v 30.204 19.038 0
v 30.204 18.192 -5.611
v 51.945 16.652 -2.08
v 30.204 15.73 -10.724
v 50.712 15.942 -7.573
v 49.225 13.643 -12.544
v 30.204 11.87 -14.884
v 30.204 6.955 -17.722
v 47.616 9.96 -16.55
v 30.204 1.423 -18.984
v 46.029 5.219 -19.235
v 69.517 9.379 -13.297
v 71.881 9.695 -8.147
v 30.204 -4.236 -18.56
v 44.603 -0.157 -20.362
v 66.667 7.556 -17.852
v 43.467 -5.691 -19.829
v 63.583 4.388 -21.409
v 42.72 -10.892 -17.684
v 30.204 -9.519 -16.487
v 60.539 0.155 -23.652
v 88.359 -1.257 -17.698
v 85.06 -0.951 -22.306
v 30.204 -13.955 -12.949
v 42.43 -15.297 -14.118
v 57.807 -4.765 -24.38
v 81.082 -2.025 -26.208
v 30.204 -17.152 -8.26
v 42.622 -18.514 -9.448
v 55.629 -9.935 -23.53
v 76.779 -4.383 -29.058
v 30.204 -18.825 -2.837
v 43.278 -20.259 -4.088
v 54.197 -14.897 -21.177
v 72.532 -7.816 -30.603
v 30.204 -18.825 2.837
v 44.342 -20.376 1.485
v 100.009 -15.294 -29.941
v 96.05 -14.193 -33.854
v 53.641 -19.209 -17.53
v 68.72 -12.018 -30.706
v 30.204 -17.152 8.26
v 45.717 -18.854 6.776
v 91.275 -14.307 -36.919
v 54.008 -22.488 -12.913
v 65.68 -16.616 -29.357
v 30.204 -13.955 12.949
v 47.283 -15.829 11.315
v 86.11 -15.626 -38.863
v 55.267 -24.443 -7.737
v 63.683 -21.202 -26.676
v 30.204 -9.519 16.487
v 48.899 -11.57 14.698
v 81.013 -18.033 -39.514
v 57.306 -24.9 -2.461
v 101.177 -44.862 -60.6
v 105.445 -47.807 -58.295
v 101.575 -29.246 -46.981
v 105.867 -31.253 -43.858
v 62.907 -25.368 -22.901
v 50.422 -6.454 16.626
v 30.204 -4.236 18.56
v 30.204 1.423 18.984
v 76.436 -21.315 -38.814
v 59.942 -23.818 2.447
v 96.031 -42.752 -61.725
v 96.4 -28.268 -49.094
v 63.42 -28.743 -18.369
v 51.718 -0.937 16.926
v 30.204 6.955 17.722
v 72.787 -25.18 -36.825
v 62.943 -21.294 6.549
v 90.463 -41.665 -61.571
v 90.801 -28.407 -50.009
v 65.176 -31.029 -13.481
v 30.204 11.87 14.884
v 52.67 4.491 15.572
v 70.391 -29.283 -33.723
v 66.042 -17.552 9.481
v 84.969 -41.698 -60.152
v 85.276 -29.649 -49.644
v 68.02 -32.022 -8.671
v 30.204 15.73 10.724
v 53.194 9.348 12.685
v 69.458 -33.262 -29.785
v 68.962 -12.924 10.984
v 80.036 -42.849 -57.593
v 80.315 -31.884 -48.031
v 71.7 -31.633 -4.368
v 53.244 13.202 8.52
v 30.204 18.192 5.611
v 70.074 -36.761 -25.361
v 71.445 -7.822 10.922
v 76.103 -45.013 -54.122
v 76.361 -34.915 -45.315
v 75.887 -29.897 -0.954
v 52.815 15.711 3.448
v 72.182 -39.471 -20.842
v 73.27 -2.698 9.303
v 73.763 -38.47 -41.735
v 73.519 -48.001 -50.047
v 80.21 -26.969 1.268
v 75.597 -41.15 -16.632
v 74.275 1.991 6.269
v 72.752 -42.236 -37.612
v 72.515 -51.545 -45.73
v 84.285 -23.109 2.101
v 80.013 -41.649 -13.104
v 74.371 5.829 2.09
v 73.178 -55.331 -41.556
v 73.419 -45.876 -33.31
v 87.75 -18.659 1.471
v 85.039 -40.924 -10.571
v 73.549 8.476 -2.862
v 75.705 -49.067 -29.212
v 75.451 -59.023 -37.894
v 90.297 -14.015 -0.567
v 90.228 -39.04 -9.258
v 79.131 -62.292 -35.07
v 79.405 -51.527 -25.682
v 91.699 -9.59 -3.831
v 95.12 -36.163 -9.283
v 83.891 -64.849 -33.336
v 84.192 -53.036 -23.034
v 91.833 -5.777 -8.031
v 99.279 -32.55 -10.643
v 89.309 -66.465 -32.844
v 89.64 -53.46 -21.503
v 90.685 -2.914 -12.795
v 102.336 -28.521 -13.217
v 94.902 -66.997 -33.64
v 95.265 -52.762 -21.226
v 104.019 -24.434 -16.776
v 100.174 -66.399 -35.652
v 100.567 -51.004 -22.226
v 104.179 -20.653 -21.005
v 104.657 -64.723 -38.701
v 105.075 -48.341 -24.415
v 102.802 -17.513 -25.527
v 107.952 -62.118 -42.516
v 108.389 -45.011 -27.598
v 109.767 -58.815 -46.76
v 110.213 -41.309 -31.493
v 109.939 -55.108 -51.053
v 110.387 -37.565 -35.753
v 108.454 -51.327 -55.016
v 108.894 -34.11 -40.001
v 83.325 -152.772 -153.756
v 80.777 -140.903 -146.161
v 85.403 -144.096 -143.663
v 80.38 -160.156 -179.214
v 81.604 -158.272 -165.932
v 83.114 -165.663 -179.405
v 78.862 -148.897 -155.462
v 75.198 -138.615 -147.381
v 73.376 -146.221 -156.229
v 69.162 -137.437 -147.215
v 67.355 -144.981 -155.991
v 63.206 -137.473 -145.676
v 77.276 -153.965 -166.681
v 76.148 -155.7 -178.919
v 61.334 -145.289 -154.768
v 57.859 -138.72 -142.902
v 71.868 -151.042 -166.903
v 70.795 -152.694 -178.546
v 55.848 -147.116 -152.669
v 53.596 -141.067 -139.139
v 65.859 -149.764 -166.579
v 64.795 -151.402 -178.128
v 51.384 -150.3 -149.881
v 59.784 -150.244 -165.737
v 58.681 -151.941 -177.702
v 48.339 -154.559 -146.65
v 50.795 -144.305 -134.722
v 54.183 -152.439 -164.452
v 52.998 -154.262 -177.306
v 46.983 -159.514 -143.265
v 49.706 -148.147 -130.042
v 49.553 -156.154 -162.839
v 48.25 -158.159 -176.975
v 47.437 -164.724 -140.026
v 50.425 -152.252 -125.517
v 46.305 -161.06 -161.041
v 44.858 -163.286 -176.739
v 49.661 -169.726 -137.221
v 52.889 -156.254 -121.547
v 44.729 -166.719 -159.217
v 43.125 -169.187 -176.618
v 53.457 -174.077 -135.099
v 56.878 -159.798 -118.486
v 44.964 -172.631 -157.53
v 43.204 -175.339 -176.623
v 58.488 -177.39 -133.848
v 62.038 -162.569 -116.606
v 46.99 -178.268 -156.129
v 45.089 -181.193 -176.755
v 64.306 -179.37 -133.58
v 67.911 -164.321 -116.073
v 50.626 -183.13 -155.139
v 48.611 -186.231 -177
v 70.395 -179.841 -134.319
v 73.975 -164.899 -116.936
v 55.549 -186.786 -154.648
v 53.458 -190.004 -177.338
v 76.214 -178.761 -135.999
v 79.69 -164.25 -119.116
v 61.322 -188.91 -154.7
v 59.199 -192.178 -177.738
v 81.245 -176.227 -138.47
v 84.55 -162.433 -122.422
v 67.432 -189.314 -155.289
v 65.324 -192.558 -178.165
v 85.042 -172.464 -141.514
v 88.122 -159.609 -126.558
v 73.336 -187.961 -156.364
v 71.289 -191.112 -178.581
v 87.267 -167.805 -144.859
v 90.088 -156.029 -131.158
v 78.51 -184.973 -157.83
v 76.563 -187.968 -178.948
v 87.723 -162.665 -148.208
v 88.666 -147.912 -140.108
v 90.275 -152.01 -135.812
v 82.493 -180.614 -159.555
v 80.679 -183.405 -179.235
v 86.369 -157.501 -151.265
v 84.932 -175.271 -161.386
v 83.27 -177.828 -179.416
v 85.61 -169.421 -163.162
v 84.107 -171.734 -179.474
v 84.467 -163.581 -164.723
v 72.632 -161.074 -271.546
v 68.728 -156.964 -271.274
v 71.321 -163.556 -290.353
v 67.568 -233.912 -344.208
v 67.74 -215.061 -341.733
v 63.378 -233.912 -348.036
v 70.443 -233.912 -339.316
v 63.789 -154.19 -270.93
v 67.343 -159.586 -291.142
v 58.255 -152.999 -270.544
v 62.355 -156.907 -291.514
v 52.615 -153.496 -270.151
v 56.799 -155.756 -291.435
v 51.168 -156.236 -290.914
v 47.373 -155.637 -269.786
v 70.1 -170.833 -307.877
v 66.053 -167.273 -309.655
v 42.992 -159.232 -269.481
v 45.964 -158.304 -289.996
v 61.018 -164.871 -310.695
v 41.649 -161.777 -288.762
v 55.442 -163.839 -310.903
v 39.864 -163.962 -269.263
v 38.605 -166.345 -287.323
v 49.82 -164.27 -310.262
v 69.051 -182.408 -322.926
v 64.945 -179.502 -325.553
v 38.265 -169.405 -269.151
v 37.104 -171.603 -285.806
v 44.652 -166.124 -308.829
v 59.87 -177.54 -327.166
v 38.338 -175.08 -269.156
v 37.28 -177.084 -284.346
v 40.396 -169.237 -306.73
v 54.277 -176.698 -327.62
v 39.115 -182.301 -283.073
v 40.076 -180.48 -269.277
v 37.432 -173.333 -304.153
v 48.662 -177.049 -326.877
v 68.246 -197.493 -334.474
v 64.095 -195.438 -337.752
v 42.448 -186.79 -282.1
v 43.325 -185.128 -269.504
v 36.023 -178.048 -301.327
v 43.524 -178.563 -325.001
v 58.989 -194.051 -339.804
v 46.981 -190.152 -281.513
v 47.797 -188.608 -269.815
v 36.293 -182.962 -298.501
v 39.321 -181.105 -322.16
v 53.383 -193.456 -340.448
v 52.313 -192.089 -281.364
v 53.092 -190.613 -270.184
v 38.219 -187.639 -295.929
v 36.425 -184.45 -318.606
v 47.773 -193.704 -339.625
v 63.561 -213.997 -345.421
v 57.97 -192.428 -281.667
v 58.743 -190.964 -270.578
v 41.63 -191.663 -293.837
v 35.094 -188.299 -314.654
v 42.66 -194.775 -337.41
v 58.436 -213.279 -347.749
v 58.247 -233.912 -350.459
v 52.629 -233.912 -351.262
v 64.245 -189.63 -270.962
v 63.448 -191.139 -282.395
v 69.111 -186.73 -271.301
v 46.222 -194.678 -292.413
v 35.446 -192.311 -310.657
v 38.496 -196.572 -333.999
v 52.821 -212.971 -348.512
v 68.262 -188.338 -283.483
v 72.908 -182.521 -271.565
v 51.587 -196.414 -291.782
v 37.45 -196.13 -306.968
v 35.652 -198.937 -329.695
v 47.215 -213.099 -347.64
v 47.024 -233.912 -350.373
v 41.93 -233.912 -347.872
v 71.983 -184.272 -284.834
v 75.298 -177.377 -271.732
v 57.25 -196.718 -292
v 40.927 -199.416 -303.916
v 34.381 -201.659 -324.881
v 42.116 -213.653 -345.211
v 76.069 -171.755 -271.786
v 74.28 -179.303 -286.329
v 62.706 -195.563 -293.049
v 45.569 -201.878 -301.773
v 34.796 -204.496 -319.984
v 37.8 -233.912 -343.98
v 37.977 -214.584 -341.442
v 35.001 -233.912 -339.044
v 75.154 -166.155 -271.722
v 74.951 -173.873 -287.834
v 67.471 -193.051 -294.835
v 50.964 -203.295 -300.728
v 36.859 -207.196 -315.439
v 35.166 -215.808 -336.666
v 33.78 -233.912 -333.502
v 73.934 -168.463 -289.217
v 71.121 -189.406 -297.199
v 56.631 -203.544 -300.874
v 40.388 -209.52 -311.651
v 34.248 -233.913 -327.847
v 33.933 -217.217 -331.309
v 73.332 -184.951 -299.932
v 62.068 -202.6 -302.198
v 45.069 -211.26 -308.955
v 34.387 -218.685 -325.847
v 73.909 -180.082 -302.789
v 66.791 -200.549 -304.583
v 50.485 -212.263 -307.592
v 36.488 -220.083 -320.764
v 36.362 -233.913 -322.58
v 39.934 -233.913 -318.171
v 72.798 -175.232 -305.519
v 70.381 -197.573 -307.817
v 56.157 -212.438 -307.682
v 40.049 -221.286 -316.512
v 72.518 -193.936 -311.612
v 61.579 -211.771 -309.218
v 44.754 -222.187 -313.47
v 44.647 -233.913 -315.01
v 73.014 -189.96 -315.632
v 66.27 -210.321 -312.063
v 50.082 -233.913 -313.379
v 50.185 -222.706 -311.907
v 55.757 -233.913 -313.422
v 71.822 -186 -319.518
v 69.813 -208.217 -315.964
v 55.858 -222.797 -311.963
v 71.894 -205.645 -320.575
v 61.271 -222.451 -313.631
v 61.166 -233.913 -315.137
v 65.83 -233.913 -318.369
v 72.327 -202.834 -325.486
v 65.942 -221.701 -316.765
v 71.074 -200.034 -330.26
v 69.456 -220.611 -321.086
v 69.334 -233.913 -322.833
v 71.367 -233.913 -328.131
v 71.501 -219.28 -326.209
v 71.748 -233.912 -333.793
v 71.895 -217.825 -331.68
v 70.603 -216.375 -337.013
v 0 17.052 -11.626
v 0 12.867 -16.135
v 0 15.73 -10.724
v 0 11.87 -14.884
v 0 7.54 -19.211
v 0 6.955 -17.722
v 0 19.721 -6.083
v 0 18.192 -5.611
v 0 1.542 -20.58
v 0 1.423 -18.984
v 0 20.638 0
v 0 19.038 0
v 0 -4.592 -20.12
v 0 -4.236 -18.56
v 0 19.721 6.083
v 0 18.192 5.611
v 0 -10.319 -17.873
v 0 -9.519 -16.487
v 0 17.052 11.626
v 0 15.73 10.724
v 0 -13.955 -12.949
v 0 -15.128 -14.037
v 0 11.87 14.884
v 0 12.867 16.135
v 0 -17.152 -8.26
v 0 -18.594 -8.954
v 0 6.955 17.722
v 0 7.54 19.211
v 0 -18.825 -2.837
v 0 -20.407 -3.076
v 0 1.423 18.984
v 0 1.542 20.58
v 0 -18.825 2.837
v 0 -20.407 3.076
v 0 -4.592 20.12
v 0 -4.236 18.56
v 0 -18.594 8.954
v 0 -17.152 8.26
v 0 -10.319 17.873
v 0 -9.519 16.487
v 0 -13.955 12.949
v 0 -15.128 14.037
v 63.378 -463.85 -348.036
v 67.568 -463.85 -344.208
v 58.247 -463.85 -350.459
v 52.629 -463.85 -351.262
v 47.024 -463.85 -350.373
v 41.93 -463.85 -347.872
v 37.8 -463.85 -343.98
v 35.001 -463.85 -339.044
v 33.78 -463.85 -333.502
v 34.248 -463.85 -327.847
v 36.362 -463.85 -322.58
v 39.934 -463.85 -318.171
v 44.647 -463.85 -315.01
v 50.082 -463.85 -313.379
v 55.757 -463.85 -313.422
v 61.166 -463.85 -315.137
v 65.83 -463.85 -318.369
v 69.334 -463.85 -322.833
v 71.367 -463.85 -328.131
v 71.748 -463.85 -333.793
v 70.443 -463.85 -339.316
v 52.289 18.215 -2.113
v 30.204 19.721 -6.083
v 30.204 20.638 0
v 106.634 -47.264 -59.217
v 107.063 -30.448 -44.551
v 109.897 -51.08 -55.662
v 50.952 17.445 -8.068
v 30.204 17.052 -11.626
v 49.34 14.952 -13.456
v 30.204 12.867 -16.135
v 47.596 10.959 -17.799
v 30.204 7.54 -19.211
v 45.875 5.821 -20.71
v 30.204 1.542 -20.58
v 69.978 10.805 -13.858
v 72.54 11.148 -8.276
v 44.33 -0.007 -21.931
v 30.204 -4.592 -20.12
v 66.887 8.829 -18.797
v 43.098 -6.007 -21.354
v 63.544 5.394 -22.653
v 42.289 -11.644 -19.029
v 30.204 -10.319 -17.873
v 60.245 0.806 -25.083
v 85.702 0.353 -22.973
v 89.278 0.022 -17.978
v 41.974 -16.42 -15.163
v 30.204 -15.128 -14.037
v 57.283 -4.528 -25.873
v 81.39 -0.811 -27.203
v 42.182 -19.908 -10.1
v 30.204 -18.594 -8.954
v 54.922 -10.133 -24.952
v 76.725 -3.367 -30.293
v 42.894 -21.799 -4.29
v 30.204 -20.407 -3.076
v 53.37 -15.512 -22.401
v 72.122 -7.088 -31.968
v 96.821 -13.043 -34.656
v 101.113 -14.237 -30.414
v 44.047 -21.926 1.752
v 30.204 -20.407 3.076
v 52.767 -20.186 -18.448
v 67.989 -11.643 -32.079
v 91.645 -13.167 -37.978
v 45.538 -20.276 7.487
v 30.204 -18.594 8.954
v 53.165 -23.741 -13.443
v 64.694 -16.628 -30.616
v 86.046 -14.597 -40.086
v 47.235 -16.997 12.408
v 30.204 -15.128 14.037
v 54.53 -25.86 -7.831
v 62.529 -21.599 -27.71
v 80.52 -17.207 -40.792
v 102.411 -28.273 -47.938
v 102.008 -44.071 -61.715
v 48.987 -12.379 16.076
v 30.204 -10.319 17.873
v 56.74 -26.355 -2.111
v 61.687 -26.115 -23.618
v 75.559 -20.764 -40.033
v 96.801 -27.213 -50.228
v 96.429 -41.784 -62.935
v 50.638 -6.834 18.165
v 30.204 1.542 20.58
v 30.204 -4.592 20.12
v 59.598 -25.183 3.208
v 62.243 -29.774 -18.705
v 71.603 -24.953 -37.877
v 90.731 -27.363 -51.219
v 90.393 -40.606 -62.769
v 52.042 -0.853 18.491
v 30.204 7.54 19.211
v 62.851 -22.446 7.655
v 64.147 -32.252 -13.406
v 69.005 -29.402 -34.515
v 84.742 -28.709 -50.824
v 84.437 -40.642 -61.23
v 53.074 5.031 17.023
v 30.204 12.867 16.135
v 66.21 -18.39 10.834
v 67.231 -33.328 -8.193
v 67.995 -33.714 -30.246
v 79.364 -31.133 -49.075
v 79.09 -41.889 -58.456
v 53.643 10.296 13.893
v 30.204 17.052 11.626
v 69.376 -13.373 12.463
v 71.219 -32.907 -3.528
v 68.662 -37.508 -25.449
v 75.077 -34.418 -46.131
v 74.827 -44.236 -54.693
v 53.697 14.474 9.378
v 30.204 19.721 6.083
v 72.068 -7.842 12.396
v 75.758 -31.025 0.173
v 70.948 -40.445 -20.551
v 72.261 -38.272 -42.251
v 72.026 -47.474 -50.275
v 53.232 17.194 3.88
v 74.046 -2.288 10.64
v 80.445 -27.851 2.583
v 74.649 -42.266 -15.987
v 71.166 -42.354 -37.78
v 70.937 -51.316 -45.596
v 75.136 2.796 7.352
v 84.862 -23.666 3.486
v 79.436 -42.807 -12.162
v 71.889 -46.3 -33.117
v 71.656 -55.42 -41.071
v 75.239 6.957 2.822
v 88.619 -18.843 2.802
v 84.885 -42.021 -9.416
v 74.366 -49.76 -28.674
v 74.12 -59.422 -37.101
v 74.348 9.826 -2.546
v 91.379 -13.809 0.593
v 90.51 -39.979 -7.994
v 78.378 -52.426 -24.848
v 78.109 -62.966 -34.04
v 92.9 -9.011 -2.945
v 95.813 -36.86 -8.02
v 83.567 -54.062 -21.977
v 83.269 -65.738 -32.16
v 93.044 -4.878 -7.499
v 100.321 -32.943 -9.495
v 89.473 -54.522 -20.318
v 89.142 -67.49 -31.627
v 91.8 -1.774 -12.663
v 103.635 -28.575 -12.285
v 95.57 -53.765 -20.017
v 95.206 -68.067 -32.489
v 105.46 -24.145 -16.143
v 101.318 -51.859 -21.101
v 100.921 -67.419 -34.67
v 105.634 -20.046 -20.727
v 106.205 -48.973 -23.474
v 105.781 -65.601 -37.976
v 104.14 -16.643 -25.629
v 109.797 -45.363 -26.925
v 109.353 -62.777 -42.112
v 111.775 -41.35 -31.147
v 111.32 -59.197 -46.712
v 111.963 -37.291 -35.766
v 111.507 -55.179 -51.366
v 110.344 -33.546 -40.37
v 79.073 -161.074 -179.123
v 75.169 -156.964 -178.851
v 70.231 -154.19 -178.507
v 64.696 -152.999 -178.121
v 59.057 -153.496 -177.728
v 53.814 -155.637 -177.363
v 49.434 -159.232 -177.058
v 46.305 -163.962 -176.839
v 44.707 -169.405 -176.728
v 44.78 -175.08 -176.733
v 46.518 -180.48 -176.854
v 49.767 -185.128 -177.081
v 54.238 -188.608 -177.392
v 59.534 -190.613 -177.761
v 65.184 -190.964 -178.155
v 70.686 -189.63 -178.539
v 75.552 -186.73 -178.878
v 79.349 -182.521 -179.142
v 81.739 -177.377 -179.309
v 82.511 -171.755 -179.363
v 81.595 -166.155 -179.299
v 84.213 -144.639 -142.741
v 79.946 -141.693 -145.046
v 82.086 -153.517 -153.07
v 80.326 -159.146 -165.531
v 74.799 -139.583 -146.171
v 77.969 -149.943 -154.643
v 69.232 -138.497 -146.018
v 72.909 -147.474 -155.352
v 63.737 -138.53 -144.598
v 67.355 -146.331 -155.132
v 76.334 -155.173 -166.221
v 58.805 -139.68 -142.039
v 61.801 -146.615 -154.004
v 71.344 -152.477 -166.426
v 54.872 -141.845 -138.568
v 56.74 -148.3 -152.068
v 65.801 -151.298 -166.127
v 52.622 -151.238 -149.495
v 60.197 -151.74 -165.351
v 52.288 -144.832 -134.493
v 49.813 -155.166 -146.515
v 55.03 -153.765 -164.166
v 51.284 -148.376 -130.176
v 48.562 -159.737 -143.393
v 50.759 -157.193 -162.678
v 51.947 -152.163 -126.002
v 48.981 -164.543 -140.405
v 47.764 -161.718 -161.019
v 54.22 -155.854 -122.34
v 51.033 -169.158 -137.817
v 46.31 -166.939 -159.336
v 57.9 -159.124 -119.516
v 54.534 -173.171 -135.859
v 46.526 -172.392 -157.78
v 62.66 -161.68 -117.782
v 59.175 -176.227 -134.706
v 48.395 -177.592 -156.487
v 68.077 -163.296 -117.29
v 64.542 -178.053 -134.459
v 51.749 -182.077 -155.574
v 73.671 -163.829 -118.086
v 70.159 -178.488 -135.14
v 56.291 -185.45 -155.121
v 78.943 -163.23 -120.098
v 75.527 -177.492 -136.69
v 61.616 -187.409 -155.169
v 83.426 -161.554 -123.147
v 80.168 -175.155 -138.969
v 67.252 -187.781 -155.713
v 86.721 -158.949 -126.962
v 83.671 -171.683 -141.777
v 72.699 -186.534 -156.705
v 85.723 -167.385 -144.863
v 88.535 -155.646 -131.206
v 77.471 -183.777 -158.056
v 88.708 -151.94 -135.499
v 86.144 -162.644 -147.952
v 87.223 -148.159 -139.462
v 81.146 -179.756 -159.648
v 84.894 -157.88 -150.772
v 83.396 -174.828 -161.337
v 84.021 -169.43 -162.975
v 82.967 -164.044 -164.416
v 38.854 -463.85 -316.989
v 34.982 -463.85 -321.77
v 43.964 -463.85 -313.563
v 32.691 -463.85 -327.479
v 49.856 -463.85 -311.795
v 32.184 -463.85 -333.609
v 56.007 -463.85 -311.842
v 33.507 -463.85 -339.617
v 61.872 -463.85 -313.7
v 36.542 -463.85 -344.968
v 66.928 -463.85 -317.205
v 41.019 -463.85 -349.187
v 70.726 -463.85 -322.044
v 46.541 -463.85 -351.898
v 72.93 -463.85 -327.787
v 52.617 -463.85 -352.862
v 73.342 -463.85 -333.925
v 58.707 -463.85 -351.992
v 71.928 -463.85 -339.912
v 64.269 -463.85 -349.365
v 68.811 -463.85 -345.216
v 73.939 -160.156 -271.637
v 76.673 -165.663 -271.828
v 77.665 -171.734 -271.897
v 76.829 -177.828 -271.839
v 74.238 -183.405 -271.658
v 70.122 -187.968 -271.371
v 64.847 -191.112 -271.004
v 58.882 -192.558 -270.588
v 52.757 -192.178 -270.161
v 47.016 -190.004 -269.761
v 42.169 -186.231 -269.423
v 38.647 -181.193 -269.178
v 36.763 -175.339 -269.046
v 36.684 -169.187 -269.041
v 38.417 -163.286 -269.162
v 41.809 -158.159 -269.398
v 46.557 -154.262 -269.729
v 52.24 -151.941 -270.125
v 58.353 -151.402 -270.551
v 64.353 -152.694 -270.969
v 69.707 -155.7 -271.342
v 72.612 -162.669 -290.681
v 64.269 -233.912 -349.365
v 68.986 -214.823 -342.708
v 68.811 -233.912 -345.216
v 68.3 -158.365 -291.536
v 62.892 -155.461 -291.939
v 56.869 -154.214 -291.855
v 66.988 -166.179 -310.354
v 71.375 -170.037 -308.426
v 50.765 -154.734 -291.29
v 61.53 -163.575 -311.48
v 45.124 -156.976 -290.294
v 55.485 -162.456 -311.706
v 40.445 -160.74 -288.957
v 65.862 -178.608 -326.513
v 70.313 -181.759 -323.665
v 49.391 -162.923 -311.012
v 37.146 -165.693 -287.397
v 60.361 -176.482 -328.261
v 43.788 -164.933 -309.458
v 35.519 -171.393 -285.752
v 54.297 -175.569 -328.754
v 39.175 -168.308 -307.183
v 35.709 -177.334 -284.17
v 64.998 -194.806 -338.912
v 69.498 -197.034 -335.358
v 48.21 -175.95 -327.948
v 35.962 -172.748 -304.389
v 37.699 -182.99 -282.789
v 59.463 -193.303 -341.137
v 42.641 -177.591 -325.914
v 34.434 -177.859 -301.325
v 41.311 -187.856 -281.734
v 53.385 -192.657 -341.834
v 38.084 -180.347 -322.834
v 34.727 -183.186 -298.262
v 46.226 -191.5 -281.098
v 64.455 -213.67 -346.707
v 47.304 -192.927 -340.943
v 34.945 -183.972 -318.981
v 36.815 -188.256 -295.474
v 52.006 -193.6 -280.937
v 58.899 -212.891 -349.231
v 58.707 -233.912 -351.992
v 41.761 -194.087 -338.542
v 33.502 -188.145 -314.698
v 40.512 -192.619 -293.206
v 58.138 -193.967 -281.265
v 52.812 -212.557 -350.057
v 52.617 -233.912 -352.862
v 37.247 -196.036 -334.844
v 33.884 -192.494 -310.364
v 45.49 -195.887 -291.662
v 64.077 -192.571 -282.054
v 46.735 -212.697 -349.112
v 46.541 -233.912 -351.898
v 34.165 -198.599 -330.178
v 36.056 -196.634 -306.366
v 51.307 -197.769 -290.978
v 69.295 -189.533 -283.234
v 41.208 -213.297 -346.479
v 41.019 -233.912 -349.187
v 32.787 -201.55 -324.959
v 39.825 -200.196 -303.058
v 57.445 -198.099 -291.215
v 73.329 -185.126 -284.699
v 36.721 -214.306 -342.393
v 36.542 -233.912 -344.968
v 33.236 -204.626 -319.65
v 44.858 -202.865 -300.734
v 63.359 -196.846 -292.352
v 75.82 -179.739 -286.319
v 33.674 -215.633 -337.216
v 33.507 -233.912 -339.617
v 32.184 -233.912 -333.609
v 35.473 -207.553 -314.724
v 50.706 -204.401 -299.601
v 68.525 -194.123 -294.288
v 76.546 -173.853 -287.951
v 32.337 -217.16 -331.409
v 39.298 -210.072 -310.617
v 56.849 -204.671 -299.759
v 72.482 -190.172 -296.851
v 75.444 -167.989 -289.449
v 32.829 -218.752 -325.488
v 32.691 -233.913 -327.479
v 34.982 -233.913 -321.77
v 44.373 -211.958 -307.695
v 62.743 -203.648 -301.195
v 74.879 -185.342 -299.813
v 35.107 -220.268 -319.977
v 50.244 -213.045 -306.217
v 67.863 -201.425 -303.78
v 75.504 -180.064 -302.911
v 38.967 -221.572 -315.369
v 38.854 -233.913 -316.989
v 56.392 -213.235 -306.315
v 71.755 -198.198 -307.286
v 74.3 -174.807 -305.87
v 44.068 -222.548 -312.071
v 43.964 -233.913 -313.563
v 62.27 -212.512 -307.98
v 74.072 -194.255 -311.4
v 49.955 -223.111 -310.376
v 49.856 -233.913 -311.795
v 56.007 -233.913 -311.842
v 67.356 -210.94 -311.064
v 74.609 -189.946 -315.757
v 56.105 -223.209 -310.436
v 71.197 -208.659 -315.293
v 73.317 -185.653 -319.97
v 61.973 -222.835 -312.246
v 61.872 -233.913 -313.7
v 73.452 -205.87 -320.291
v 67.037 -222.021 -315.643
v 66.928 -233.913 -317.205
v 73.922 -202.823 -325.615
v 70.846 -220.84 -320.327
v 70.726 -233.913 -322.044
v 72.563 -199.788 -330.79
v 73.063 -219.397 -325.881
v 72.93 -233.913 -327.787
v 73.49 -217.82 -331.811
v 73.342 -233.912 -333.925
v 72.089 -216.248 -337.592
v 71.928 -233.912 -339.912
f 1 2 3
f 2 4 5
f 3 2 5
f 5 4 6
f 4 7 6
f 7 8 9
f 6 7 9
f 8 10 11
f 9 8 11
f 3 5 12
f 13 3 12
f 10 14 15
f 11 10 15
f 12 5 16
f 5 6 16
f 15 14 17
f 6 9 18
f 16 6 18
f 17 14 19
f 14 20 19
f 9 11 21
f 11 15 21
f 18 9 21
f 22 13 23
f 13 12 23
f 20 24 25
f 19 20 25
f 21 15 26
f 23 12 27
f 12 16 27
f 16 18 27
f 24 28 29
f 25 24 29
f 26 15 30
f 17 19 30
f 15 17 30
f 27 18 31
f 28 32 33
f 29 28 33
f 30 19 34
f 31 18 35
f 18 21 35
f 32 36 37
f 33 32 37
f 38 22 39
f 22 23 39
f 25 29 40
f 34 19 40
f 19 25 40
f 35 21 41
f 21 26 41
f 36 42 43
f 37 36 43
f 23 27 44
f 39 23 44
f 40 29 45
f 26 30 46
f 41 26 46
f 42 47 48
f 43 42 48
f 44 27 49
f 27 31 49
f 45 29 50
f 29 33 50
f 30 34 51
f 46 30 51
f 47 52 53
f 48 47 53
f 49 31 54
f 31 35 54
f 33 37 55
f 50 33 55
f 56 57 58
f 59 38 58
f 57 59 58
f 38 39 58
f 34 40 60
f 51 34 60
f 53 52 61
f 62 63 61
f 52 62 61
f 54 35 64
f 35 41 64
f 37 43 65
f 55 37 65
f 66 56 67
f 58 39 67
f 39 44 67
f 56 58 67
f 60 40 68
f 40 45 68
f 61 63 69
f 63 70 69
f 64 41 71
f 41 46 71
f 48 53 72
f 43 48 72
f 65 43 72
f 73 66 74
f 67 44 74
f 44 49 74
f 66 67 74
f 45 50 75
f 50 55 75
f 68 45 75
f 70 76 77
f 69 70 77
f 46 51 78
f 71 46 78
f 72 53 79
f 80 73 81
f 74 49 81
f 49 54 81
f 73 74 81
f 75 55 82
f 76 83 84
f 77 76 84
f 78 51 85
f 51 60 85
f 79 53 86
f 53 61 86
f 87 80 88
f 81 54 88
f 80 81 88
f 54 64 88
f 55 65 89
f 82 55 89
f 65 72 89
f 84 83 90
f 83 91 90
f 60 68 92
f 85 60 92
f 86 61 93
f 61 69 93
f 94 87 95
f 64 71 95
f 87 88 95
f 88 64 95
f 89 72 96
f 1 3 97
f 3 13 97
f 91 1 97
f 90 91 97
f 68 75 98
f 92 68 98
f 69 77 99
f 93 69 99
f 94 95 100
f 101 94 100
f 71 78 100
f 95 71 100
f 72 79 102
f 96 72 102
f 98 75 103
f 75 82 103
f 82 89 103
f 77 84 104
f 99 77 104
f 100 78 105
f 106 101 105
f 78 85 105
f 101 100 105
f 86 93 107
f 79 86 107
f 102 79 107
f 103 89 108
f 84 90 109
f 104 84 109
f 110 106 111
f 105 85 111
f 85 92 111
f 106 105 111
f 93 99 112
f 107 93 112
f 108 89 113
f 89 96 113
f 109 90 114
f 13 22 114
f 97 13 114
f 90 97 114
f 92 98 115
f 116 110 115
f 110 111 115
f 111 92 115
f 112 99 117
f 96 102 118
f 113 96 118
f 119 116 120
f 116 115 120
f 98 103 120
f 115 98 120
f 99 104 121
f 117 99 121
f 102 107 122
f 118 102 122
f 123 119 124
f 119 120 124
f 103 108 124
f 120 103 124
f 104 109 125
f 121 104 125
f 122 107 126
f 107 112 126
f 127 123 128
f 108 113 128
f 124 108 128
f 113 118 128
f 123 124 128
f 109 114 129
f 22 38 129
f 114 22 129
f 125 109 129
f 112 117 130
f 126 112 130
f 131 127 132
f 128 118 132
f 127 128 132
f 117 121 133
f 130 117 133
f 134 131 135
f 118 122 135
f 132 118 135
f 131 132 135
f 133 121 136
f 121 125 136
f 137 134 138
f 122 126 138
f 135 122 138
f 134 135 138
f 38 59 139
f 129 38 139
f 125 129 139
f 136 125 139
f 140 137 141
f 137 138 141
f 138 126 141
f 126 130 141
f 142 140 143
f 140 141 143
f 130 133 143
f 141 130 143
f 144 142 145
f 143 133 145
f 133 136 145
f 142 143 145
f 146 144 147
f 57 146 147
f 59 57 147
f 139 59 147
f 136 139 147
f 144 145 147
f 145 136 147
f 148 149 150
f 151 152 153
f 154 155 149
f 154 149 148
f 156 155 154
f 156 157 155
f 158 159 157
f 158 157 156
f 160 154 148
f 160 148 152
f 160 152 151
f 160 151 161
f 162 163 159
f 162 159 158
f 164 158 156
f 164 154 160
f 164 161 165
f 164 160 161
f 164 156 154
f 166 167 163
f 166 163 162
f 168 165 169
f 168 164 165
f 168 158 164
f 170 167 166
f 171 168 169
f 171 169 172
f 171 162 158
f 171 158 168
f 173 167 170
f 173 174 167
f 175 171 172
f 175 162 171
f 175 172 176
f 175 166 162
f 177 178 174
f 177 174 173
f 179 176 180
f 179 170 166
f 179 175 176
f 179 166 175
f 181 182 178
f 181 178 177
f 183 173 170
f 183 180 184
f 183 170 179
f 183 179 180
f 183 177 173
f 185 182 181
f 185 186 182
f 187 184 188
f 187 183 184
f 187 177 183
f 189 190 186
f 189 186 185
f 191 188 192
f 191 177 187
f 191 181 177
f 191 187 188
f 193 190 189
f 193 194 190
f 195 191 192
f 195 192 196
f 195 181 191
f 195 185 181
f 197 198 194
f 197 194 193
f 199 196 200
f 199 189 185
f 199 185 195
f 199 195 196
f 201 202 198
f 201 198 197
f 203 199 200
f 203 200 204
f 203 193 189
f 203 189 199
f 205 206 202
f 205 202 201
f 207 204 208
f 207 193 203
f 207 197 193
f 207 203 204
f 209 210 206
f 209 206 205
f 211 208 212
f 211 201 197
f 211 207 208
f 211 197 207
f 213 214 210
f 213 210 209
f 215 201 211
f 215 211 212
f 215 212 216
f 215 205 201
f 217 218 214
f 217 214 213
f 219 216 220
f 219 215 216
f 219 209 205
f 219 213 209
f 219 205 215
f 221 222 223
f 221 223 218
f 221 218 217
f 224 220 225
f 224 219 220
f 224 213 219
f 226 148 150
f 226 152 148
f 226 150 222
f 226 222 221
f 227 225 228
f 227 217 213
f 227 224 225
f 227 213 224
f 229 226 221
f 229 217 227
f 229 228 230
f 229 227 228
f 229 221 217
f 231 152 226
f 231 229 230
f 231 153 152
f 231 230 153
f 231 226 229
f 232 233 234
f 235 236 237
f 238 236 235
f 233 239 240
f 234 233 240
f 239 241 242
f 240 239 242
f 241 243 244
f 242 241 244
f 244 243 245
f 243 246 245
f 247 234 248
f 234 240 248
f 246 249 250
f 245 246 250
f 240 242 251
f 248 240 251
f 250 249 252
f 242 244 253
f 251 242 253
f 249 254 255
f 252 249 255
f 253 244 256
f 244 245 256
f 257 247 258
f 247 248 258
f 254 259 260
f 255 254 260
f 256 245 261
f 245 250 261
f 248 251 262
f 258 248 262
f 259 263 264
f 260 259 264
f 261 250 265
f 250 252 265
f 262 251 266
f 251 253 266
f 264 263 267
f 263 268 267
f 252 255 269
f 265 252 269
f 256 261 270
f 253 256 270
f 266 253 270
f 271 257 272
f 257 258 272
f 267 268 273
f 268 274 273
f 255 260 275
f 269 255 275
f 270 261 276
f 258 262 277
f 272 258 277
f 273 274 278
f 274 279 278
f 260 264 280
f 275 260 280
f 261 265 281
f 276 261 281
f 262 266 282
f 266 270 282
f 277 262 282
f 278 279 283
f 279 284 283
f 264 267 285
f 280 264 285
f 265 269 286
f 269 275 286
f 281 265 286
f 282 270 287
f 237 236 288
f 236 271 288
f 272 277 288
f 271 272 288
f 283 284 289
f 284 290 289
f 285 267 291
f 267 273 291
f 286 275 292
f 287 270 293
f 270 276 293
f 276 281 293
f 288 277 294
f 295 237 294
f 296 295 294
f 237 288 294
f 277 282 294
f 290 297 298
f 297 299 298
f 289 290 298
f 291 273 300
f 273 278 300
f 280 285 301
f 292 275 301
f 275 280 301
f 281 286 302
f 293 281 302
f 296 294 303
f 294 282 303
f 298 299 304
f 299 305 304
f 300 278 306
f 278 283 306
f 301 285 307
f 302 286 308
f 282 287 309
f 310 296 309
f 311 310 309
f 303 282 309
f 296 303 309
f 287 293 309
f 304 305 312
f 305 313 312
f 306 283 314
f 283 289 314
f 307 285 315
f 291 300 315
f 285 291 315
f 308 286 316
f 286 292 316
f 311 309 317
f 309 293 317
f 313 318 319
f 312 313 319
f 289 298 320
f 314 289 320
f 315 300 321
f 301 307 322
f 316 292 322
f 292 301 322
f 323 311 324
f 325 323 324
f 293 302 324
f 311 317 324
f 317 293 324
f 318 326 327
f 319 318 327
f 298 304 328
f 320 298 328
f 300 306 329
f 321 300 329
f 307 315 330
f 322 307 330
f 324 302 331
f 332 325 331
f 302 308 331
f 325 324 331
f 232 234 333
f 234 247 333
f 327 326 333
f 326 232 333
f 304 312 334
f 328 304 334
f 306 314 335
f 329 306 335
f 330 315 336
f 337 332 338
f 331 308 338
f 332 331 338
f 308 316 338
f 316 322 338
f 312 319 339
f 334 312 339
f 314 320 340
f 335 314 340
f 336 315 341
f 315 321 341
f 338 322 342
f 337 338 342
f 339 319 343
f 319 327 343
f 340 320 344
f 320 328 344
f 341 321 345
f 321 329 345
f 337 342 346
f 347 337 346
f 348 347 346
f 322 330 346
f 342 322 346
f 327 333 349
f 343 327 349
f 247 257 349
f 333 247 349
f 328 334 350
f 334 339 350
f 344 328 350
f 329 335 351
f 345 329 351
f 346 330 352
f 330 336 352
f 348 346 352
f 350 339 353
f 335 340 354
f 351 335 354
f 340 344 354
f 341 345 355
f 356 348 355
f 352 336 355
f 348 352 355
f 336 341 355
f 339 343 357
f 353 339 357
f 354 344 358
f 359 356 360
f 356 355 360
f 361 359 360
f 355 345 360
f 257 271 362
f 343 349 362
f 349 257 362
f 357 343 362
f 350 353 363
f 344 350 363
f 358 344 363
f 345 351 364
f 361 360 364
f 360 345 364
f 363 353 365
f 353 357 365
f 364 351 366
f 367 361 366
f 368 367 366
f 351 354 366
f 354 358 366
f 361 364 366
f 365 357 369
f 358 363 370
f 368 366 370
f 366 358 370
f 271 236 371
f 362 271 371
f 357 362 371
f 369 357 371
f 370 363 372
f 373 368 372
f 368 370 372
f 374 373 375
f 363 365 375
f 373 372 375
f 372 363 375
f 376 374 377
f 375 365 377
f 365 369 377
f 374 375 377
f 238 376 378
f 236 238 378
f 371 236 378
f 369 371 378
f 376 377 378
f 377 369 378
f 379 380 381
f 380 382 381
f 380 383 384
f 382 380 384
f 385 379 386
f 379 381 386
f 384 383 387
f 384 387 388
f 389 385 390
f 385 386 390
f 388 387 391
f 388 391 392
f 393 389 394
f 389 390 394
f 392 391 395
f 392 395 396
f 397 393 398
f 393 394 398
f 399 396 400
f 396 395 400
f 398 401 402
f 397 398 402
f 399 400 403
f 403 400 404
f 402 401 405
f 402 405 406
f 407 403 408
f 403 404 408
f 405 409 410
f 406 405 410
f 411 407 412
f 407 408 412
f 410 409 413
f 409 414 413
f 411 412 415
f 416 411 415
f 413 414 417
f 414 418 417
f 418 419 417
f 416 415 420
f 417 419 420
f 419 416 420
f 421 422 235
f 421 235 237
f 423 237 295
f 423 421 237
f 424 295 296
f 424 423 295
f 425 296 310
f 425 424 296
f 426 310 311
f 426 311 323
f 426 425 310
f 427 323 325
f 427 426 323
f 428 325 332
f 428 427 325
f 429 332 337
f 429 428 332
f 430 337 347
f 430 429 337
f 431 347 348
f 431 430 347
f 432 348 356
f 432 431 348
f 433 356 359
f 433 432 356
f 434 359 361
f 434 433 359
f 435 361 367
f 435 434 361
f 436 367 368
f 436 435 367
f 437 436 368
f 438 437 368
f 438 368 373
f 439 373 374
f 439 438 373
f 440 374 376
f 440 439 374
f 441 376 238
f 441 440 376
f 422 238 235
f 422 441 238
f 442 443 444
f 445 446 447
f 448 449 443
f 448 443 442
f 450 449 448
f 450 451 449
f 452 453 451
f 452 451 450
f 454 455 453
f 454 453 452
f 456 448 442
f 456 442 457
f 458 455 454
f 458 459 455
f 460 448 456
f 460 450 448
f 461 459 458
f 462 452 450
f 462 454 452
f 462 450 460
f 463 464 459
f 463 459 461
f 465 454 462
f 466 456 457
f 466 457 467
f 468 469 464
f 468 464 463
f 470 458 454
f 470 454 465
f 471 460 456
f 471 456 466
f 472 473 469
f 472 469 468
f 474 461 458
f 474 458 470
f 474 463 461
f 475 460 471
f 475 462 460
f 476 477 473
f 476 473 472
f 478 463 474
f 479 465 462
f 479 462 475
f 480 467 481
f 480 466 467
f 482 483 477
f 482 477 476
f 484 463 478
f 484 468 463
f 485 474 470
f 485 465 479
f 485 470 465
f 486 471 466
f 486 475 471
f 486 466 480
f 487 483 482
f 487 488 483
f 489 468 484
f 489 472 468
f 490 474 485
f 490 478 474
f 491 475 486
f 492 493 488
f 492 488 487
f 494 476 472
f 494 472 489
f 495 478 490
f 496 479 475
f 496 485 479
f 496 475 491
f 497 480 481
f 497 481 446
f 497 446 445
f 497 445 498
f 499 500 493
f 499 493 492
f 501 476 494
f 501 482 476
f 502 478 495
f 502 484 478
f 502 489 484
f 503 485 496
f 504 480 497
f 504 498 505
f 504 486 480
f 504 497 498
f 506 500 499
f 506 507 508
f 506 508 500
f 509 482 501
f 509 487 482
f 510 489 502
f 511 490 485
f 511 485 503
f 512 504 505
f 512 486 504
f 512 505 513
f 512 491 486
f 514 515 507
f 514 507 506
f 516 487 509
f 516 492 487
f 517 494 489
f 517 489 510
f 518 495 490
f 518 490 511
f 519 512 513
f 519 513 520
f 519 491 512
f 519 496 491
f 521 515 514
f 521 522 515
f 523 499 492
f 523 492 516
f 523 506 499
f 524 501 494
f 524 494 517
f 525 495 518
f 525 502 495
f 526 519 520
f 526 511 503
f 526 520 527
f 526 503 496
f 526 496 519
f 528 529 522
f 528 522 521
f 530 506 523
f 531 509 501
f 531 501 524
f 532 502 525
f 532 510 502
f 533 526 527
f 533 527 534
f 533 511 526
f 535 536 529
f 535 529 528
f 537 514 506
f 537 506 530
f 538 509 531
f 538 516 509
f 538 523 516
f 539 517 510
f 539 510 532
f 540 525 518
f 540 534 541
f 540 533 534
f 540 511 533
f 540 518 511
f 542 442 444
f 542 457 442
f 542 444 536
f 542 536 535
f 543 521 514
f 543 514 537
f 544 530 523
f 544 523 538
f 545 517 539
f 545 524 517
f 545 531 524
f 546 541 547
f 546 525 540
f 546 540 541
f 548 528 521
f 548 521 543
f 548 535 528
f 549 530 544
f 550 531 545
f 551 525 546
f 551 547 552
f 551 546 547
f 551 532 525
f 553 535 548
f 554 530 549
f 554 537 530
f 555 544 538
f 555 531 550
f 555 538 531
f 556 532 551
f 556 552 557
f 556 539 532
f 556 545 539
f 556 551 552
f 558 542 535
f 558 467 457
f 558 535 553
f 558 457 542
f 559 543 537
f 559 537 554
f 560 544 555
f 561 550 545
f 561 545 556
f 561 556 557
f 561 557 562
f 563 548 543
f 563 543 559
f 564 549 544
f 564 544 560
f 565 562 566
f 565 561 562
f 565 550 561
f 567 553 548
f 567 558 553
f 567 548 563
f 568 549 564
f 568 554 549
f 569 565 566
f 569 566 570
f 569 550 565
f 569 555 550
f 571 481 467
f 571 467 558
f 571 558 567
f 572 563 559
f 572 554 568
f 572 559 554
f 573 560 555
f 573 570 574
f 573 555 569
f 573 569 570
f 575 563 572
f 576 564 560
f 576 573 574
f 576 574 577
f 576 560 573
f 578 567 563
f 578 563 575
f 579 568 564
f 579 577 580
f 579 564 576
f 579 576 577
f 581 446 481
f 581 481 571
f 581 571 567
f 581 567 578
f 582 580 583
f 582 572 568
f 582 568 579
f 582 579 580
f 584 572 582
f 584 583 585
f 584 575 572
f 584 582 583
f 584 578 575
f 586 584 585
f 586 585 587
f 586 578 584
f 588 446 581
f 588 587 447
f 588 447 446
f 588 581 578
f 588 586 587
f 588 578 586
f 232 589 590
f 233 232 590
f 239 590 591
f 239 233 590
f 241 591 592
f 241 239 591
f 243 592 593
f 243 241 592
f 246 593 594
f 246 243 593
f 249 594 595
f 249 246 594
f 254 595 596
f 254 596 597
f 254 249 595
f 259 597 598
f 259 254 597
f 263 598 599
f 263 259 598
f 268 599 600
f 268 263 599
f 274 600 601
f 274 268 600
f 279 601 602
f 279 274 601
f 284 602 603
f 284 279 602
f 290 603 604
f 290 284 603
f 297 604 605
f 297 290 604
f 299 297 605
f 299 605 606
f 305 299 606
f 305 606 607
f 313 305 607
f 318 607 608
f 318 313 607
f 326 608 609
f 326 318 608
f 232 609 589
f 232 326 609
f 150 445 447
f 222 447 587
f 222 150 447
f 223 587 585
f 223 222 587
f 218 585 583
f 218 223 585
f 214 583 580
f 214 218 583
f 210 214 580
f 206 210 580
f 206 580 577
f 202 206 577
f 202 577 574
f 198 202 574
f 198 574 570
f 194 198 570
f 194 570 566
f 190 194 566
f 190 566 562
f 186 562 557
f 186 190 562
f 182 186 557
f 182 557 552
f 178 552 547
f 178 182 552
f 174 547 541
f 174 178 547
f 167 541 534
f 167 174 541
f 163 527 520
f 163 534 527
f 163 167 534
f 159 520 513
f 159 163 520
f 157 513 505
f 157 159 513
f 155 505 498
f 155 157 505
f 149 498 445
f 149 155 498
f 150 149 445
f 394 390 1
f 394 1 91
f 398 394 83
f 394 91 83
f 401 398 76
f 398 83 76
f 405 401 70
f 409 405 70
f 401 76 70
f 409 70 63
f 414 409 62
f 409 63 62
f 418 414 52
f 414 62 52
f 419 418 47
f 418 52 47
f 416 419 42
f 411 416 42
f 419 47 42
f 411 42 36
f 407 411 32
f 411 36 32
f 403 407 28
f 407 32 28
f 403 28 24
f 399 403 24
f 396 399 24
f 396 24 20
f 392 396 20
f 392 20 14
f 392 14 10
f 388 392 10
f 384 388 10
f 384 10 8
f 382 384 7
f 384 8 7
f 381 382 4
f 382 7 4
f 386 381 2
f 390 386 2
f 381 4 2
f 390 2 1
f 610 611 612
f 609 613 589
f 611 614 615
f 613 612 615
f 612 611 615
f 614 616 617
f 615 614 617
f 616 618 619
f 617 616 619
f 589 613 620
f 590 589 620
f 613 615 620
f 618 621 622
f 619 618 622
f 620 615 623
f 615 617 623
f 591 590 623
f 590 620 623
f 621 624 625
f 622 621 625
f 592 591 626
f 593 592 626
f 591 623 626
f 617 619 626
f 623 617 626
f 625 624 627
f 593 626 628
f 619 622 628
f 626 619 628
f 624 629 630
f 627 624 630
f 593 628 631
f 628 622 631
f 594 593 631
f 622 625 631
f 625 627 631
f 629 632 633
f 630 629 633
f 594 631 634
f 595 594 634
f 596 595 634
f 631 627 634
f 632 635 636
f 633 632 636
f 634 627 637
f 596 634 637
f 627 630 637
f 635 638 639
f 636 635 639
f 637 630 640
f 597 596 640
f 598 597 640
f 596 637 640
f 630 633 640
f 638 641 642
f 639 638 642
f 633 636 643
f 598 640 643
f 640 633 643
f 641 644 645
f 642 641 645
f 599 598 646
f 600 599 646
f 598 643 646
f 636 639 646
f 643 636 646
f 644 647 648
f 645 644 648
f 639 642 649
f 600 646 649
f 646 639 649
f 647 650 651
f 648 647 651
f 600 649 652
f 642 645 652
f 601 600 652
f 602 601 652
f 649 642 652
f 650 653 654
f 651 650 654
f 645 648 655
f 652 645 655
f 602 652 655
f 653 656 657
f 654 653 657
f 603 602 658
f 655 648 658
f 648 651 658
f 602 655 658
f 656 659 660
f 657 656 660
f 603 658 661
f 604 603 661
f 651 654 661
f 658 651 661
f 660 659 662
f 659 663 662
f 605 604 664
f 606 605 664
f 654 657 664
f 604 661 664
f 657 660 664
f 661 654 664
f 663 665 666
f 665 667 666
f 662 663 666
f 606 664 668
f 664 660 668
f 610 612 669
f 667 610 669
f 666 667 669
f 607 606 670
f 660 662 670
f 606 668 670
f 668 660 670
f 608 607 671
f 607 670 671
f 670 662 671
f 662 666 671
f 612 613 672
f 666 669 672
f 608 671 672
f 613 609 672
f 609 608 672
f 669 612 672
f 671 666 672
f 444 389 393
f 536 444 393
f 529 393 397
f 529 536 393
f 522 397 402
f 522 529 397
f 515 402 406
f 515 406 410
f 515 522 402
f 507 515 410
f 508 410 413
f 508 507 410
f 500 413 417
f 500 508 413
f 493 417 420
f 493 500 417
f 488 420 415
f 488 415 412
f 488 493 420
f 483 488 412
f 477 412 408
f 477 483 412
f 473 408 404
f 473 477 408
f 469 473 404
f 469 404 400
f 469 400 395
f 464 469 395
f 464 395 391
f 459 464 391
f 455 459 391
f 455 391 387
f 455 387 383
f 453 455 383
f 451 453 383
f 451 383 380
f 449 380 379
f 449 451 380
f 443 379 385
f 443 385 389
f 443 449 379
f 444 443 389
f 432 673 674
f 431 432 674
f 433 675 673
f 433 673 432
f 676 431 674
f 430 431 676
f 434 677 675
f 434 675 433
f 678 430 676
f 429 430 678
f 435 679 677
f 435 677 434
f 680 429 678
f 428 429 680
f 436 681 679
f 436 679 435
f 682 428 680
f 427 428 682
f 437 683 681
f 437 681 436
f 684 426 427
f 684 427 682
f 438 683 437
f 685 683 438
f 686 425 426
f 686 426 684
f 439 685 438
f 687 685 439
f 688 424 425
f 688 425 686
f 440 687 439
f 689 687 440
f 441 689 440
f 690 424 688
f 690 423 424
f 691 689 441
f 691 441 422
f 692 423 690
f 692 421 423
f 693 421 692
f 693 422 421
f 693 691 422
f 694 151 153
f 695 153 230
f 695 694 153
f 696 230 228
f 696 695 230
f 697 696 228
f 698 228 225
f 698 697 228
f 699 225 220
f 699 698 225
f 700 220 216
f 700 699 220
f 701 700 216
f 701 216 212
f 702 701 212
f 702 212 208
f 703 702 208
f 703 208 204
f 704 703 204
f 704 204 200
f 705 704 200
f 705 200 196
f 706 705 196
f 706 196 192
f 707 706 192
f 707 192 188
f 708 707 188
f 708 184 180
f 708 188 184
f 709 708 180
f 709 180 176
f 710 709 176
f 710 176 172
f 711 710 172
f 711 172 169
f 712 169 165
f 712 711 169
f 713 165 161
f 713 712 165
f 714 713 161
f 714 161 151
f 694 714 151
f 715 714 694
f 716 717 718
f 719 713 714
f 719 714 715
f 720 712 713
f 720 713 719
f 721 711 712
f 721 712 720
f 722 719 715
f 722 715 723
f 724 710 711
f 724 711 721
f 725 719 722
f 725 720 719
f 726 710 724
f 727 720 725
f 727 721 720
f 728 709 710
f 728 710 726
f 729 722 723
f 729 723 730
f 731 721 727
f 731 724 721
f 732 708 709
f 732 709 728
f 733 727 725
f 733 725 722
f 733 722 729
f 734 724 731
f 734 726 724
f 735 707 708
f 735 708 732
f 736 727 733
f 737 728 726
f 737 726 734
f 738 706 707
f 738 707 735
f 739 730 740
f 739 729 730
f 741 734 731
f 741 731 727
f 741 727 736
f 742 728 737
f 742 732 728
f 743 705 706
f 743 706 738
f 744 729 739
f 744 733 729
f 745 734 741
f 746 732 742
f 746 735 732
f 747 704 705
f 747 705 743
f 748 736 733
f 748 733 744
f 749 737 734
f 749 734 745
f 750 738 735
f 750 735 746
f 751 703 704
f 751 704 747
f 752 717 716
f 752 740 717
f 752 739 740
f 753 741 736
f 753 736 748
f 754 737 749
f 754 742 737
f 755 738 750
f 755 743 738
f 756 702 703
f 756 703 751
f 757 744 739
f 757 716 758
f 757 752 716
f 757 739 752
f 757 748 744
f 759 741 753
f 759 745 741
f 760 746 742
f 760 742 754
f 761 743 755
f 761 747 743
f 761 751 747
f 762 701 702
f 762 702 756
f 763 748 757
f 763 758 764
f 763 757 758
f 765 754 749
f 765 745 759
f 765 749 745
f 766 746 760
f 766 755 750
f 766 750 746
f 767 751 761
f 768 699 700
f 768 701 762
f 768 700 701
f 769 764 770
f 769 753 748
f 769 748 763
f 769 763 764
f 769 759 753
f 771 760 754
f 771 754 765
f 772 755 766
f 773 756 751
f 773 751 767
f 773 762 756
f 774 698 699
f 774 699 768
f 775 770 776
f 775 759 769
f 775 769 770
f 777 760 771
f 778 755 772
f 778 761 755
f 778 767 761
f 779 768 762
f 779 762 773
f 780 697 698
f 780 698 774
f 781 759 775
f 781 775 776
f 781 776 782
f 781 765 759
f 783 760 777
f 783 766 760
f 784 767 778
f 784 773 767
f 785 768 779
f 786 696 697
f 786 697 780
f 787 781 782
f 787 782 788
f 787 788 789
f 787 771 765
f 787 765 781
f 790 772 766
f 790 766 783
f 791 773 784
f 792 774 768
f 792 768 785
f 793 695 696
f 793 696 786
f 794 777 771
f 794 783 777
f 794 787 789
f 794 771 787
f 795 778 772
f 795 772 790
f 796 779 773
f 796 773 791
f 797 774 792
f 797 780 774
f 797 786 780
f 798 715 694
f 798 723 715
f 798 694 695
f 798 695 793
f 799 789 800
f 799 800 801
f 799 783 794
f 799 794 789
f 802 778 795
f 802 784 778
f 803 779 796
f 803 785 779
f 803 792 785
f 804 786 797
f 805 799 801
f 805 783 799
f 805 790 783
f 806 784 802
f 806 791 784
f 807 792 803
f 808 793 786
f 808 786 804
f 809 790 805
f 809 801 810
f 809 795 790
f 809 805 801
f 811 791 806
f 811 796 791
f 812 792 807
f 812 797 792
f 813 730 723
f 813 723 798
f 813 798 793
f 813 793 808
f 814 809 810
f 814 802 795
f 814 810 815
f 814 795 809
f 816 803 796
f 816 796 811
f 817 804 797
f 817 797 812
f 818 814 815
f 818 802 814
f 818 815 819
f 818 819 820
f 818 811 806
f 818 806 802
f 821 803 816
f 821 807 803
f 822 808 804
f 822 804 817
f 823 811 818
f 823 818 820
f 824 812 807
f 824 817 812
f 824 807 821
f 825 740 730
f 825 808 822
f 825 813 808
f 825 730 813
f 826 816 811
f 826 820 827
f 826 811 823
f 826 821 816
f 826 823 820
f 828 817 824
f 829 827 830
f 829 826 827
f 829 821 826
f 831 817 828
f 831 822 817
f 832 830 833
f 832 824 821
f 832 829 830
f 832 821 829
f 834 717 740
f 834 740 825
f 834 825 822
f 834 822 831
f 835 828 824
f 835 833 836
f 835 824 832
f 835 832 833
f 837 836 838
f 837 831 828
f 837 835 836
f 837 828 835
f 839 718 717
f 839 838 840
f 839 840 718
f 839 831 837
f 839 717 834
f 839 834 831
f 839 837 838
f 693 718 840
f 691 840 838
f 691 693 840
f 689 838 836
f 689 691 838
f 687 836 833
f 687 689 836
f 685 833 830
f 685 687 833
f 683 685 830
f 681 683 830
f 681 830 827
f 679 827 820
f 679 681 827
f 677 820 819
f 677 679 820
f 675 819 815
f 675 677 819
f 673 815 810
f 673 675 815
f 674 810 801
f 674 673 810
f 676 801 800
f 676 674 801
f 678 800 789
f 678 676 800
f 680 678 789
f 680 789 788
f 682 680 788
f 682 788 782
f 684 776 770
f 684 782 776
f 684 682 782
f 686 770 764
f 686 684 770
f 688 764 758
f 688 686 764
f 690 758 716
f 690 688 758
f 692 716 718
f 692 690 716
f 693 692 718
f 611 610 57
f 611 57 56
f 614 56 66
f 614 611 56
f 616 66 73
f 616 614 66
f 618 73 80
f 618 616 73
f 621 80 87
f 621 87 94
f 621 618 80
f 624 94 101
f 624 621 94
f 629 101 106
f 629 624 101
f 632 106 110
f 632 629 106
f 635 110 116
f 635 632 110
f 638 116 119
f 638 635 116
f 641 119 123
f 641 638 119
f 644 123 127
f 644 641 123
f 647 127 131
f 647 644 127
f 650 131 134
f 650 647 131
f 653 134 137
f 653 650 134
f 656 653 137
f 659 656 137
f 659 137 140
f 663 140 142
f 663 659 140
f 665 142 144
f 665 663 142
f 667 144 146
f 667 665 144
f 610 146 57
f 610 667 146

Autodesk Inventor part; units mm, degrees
sketch "Sketch1" plane through (0, 0, 0) normal (1, 0, 0) x (0, 1, 0)
  line L0 (0, 0) -> (-172, -150)
  line L1 (-172, -150) -> (-172, -332.225)
  line L2 (-172, -332.225) -> (-463.85, -332.225)
  line L3 (0, 0) -> (0, -103.1875) construction
  line L4 (0, -103.1875) -> (-172, -65.475) construction
  line L5 (-172, -52.775) -> (-463.85, -52.775) construction
  dimension "d0" = 332.225
  dimension "d1" = 172
  dimension "d4" = 150
  dimension "d5" = 463.85
  dimension "d6" = 103.1875
  dimension "d7" = 52.775
  dimension "d8" = 65.475
ref_plane "Work Plane1" through (103.1875, 0, 0) normal (1, 0, 0) x (0, 1, 0)
ref_plane "Work Plane2" through (65.475, 0, 0) normal (1, 0, 0) x (0, 1, 0)
ref_plane "Work Plane3" through (52.775, 0, 0) normal (1, 0, 0) x (0, 1, 0)
sketch "Sketch2" plane through (103.1875, 0, 0) normal (1, 0, 0) x (0, 1, 0)
  point P0 (0, 0)
  point P1 (0, 0)
sketch "Sketch3" plane through (65.475, 0, 0) normal (1, 0, 0) x (0, 1, 0)
  point P0 (0, 0)
  point P1 (-172, -150)
  point P2 (-172, -332.225)
sketch "Sketch4" plane through (52.775, 0, 0) normal (1, 0, 0) x (0, 1, 0)
  point P0 (0, 0)
  point P1 (-463.85, -332.225)
  point P2 (-172, -332.225)
sketch "Sketch5" plane through (0, 0, 0) normal (1, 0, 0) x (0, 1, 0)
  circle A0 centre (0, 0) radius 20.6375
  circle A1 centre (0, 0) radius 19.0375
  dimension "d15" = 1.6
  dimension "d17" = 41.275
sketch3d "3D Sketch1"
  line L0 (0, 0, 0) -> (30.2045, 0, 0)
  arc A0 (30.2045, 0, 0) -> (91.2887, -54.2685, -47.3272) centre (30.2045, -46.6611, -40.6928) ccw
  line L1 (91.2887, -54.2685, -47.3272) -> (70.0575, -151.1, -131.7733)
  arc A1 (70.0575, -151.1, -131.7733) -> (63.5208, -172, -178.0393) centre (73.1654, -110.847, -178.7115) ccw
  line L2 (63.5208, -172, -178.0393) -> (57.0795, -172, -270.4623)
  arc A2 (57.0795, -172, -270.4623) -> (52.775, -233.9125, -332.225) centre (57.0795, -233.9125, -270.4623) ccw
  line L3 (52.775, -233.9125, -332.225) -> (52.775, -463.85, -332.225)
  dimension "d12" = 61.9125
  dimension "d13" = 61.9125
  dimension "d14" = 61.9125
sweep "Sweep1" add profiles "Sketch5" path "3D Sketch1"
equation "\"d13\" = d12"
equation "\"d14\" = d12"
equation "\"d9\" = d6"
equation "\"d10\" = d8"
equation "\"d11\" = d7"
properties part number "exhaust header right pipe 2" material "Steel"
